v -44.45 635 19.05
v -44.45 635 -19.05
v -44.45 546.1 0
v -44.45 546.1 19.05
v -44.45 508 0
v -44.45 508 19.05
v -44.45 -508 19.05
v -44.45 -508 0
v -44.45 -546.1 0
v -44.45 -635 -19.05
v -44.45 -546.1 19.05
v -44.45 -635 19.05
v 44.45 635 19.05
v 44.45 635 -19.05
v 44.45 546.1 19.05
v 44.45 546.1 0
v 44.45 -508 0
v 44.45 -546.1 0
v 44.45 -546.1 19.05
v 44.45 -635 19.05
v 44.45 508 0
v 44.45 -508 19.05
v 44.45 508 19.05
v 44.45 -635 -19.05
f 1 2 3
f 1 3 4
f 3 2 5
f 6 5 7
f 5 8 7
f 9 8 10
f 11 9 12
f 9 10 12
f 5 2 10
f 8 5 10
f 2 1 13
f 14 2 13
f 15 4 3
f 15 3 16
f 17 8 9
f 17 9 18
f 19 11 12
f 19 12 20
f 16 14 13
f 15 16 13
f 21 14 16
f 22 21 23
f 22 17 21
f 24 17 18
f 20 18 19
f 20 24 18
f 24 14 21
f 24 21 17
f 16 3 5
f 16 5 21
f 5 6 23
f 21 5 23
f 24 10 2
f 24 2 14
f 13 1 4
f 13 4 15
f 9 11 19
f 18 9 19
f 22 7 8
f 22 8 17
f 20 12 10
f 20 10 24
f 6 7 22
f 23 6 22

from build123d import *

# Parameters (mm, degrees)
F0_W     = 88.9
F0_H     = 38.1
F1_DEPTH = 635
F2_W     = 88.9
F2_H     = 38.1
F3_DEPTH = 19.05


# Not quite as in the source:
# - a length typed as a fraction of an inch, garbled in the dataset ("3 / 203.2 mm" for 3/8 in), is restored


with BuildPart() as f1:
    # F0 (on Front) → F1 (new body, symmetric)
    with BuildSketch(Plane.XZ):
        Rectangle(F0_W, F0_H)
    extrude(amount=F1_DEPTH, both=True)

    # F2 (on face) → F3 (cut)
    with BuildSketch(Plane.XY.offset(19.05)):
        with Locations((0, 527.05)):
            Rectangle(F2_W, F2_H)
        with Locations((0, -527.05)):
            Rectangle(F2_W, F2_H)
    extrude(amount=-F3_DEPTH, mode=Mode.SUBTRACT)


solid = f1.part
